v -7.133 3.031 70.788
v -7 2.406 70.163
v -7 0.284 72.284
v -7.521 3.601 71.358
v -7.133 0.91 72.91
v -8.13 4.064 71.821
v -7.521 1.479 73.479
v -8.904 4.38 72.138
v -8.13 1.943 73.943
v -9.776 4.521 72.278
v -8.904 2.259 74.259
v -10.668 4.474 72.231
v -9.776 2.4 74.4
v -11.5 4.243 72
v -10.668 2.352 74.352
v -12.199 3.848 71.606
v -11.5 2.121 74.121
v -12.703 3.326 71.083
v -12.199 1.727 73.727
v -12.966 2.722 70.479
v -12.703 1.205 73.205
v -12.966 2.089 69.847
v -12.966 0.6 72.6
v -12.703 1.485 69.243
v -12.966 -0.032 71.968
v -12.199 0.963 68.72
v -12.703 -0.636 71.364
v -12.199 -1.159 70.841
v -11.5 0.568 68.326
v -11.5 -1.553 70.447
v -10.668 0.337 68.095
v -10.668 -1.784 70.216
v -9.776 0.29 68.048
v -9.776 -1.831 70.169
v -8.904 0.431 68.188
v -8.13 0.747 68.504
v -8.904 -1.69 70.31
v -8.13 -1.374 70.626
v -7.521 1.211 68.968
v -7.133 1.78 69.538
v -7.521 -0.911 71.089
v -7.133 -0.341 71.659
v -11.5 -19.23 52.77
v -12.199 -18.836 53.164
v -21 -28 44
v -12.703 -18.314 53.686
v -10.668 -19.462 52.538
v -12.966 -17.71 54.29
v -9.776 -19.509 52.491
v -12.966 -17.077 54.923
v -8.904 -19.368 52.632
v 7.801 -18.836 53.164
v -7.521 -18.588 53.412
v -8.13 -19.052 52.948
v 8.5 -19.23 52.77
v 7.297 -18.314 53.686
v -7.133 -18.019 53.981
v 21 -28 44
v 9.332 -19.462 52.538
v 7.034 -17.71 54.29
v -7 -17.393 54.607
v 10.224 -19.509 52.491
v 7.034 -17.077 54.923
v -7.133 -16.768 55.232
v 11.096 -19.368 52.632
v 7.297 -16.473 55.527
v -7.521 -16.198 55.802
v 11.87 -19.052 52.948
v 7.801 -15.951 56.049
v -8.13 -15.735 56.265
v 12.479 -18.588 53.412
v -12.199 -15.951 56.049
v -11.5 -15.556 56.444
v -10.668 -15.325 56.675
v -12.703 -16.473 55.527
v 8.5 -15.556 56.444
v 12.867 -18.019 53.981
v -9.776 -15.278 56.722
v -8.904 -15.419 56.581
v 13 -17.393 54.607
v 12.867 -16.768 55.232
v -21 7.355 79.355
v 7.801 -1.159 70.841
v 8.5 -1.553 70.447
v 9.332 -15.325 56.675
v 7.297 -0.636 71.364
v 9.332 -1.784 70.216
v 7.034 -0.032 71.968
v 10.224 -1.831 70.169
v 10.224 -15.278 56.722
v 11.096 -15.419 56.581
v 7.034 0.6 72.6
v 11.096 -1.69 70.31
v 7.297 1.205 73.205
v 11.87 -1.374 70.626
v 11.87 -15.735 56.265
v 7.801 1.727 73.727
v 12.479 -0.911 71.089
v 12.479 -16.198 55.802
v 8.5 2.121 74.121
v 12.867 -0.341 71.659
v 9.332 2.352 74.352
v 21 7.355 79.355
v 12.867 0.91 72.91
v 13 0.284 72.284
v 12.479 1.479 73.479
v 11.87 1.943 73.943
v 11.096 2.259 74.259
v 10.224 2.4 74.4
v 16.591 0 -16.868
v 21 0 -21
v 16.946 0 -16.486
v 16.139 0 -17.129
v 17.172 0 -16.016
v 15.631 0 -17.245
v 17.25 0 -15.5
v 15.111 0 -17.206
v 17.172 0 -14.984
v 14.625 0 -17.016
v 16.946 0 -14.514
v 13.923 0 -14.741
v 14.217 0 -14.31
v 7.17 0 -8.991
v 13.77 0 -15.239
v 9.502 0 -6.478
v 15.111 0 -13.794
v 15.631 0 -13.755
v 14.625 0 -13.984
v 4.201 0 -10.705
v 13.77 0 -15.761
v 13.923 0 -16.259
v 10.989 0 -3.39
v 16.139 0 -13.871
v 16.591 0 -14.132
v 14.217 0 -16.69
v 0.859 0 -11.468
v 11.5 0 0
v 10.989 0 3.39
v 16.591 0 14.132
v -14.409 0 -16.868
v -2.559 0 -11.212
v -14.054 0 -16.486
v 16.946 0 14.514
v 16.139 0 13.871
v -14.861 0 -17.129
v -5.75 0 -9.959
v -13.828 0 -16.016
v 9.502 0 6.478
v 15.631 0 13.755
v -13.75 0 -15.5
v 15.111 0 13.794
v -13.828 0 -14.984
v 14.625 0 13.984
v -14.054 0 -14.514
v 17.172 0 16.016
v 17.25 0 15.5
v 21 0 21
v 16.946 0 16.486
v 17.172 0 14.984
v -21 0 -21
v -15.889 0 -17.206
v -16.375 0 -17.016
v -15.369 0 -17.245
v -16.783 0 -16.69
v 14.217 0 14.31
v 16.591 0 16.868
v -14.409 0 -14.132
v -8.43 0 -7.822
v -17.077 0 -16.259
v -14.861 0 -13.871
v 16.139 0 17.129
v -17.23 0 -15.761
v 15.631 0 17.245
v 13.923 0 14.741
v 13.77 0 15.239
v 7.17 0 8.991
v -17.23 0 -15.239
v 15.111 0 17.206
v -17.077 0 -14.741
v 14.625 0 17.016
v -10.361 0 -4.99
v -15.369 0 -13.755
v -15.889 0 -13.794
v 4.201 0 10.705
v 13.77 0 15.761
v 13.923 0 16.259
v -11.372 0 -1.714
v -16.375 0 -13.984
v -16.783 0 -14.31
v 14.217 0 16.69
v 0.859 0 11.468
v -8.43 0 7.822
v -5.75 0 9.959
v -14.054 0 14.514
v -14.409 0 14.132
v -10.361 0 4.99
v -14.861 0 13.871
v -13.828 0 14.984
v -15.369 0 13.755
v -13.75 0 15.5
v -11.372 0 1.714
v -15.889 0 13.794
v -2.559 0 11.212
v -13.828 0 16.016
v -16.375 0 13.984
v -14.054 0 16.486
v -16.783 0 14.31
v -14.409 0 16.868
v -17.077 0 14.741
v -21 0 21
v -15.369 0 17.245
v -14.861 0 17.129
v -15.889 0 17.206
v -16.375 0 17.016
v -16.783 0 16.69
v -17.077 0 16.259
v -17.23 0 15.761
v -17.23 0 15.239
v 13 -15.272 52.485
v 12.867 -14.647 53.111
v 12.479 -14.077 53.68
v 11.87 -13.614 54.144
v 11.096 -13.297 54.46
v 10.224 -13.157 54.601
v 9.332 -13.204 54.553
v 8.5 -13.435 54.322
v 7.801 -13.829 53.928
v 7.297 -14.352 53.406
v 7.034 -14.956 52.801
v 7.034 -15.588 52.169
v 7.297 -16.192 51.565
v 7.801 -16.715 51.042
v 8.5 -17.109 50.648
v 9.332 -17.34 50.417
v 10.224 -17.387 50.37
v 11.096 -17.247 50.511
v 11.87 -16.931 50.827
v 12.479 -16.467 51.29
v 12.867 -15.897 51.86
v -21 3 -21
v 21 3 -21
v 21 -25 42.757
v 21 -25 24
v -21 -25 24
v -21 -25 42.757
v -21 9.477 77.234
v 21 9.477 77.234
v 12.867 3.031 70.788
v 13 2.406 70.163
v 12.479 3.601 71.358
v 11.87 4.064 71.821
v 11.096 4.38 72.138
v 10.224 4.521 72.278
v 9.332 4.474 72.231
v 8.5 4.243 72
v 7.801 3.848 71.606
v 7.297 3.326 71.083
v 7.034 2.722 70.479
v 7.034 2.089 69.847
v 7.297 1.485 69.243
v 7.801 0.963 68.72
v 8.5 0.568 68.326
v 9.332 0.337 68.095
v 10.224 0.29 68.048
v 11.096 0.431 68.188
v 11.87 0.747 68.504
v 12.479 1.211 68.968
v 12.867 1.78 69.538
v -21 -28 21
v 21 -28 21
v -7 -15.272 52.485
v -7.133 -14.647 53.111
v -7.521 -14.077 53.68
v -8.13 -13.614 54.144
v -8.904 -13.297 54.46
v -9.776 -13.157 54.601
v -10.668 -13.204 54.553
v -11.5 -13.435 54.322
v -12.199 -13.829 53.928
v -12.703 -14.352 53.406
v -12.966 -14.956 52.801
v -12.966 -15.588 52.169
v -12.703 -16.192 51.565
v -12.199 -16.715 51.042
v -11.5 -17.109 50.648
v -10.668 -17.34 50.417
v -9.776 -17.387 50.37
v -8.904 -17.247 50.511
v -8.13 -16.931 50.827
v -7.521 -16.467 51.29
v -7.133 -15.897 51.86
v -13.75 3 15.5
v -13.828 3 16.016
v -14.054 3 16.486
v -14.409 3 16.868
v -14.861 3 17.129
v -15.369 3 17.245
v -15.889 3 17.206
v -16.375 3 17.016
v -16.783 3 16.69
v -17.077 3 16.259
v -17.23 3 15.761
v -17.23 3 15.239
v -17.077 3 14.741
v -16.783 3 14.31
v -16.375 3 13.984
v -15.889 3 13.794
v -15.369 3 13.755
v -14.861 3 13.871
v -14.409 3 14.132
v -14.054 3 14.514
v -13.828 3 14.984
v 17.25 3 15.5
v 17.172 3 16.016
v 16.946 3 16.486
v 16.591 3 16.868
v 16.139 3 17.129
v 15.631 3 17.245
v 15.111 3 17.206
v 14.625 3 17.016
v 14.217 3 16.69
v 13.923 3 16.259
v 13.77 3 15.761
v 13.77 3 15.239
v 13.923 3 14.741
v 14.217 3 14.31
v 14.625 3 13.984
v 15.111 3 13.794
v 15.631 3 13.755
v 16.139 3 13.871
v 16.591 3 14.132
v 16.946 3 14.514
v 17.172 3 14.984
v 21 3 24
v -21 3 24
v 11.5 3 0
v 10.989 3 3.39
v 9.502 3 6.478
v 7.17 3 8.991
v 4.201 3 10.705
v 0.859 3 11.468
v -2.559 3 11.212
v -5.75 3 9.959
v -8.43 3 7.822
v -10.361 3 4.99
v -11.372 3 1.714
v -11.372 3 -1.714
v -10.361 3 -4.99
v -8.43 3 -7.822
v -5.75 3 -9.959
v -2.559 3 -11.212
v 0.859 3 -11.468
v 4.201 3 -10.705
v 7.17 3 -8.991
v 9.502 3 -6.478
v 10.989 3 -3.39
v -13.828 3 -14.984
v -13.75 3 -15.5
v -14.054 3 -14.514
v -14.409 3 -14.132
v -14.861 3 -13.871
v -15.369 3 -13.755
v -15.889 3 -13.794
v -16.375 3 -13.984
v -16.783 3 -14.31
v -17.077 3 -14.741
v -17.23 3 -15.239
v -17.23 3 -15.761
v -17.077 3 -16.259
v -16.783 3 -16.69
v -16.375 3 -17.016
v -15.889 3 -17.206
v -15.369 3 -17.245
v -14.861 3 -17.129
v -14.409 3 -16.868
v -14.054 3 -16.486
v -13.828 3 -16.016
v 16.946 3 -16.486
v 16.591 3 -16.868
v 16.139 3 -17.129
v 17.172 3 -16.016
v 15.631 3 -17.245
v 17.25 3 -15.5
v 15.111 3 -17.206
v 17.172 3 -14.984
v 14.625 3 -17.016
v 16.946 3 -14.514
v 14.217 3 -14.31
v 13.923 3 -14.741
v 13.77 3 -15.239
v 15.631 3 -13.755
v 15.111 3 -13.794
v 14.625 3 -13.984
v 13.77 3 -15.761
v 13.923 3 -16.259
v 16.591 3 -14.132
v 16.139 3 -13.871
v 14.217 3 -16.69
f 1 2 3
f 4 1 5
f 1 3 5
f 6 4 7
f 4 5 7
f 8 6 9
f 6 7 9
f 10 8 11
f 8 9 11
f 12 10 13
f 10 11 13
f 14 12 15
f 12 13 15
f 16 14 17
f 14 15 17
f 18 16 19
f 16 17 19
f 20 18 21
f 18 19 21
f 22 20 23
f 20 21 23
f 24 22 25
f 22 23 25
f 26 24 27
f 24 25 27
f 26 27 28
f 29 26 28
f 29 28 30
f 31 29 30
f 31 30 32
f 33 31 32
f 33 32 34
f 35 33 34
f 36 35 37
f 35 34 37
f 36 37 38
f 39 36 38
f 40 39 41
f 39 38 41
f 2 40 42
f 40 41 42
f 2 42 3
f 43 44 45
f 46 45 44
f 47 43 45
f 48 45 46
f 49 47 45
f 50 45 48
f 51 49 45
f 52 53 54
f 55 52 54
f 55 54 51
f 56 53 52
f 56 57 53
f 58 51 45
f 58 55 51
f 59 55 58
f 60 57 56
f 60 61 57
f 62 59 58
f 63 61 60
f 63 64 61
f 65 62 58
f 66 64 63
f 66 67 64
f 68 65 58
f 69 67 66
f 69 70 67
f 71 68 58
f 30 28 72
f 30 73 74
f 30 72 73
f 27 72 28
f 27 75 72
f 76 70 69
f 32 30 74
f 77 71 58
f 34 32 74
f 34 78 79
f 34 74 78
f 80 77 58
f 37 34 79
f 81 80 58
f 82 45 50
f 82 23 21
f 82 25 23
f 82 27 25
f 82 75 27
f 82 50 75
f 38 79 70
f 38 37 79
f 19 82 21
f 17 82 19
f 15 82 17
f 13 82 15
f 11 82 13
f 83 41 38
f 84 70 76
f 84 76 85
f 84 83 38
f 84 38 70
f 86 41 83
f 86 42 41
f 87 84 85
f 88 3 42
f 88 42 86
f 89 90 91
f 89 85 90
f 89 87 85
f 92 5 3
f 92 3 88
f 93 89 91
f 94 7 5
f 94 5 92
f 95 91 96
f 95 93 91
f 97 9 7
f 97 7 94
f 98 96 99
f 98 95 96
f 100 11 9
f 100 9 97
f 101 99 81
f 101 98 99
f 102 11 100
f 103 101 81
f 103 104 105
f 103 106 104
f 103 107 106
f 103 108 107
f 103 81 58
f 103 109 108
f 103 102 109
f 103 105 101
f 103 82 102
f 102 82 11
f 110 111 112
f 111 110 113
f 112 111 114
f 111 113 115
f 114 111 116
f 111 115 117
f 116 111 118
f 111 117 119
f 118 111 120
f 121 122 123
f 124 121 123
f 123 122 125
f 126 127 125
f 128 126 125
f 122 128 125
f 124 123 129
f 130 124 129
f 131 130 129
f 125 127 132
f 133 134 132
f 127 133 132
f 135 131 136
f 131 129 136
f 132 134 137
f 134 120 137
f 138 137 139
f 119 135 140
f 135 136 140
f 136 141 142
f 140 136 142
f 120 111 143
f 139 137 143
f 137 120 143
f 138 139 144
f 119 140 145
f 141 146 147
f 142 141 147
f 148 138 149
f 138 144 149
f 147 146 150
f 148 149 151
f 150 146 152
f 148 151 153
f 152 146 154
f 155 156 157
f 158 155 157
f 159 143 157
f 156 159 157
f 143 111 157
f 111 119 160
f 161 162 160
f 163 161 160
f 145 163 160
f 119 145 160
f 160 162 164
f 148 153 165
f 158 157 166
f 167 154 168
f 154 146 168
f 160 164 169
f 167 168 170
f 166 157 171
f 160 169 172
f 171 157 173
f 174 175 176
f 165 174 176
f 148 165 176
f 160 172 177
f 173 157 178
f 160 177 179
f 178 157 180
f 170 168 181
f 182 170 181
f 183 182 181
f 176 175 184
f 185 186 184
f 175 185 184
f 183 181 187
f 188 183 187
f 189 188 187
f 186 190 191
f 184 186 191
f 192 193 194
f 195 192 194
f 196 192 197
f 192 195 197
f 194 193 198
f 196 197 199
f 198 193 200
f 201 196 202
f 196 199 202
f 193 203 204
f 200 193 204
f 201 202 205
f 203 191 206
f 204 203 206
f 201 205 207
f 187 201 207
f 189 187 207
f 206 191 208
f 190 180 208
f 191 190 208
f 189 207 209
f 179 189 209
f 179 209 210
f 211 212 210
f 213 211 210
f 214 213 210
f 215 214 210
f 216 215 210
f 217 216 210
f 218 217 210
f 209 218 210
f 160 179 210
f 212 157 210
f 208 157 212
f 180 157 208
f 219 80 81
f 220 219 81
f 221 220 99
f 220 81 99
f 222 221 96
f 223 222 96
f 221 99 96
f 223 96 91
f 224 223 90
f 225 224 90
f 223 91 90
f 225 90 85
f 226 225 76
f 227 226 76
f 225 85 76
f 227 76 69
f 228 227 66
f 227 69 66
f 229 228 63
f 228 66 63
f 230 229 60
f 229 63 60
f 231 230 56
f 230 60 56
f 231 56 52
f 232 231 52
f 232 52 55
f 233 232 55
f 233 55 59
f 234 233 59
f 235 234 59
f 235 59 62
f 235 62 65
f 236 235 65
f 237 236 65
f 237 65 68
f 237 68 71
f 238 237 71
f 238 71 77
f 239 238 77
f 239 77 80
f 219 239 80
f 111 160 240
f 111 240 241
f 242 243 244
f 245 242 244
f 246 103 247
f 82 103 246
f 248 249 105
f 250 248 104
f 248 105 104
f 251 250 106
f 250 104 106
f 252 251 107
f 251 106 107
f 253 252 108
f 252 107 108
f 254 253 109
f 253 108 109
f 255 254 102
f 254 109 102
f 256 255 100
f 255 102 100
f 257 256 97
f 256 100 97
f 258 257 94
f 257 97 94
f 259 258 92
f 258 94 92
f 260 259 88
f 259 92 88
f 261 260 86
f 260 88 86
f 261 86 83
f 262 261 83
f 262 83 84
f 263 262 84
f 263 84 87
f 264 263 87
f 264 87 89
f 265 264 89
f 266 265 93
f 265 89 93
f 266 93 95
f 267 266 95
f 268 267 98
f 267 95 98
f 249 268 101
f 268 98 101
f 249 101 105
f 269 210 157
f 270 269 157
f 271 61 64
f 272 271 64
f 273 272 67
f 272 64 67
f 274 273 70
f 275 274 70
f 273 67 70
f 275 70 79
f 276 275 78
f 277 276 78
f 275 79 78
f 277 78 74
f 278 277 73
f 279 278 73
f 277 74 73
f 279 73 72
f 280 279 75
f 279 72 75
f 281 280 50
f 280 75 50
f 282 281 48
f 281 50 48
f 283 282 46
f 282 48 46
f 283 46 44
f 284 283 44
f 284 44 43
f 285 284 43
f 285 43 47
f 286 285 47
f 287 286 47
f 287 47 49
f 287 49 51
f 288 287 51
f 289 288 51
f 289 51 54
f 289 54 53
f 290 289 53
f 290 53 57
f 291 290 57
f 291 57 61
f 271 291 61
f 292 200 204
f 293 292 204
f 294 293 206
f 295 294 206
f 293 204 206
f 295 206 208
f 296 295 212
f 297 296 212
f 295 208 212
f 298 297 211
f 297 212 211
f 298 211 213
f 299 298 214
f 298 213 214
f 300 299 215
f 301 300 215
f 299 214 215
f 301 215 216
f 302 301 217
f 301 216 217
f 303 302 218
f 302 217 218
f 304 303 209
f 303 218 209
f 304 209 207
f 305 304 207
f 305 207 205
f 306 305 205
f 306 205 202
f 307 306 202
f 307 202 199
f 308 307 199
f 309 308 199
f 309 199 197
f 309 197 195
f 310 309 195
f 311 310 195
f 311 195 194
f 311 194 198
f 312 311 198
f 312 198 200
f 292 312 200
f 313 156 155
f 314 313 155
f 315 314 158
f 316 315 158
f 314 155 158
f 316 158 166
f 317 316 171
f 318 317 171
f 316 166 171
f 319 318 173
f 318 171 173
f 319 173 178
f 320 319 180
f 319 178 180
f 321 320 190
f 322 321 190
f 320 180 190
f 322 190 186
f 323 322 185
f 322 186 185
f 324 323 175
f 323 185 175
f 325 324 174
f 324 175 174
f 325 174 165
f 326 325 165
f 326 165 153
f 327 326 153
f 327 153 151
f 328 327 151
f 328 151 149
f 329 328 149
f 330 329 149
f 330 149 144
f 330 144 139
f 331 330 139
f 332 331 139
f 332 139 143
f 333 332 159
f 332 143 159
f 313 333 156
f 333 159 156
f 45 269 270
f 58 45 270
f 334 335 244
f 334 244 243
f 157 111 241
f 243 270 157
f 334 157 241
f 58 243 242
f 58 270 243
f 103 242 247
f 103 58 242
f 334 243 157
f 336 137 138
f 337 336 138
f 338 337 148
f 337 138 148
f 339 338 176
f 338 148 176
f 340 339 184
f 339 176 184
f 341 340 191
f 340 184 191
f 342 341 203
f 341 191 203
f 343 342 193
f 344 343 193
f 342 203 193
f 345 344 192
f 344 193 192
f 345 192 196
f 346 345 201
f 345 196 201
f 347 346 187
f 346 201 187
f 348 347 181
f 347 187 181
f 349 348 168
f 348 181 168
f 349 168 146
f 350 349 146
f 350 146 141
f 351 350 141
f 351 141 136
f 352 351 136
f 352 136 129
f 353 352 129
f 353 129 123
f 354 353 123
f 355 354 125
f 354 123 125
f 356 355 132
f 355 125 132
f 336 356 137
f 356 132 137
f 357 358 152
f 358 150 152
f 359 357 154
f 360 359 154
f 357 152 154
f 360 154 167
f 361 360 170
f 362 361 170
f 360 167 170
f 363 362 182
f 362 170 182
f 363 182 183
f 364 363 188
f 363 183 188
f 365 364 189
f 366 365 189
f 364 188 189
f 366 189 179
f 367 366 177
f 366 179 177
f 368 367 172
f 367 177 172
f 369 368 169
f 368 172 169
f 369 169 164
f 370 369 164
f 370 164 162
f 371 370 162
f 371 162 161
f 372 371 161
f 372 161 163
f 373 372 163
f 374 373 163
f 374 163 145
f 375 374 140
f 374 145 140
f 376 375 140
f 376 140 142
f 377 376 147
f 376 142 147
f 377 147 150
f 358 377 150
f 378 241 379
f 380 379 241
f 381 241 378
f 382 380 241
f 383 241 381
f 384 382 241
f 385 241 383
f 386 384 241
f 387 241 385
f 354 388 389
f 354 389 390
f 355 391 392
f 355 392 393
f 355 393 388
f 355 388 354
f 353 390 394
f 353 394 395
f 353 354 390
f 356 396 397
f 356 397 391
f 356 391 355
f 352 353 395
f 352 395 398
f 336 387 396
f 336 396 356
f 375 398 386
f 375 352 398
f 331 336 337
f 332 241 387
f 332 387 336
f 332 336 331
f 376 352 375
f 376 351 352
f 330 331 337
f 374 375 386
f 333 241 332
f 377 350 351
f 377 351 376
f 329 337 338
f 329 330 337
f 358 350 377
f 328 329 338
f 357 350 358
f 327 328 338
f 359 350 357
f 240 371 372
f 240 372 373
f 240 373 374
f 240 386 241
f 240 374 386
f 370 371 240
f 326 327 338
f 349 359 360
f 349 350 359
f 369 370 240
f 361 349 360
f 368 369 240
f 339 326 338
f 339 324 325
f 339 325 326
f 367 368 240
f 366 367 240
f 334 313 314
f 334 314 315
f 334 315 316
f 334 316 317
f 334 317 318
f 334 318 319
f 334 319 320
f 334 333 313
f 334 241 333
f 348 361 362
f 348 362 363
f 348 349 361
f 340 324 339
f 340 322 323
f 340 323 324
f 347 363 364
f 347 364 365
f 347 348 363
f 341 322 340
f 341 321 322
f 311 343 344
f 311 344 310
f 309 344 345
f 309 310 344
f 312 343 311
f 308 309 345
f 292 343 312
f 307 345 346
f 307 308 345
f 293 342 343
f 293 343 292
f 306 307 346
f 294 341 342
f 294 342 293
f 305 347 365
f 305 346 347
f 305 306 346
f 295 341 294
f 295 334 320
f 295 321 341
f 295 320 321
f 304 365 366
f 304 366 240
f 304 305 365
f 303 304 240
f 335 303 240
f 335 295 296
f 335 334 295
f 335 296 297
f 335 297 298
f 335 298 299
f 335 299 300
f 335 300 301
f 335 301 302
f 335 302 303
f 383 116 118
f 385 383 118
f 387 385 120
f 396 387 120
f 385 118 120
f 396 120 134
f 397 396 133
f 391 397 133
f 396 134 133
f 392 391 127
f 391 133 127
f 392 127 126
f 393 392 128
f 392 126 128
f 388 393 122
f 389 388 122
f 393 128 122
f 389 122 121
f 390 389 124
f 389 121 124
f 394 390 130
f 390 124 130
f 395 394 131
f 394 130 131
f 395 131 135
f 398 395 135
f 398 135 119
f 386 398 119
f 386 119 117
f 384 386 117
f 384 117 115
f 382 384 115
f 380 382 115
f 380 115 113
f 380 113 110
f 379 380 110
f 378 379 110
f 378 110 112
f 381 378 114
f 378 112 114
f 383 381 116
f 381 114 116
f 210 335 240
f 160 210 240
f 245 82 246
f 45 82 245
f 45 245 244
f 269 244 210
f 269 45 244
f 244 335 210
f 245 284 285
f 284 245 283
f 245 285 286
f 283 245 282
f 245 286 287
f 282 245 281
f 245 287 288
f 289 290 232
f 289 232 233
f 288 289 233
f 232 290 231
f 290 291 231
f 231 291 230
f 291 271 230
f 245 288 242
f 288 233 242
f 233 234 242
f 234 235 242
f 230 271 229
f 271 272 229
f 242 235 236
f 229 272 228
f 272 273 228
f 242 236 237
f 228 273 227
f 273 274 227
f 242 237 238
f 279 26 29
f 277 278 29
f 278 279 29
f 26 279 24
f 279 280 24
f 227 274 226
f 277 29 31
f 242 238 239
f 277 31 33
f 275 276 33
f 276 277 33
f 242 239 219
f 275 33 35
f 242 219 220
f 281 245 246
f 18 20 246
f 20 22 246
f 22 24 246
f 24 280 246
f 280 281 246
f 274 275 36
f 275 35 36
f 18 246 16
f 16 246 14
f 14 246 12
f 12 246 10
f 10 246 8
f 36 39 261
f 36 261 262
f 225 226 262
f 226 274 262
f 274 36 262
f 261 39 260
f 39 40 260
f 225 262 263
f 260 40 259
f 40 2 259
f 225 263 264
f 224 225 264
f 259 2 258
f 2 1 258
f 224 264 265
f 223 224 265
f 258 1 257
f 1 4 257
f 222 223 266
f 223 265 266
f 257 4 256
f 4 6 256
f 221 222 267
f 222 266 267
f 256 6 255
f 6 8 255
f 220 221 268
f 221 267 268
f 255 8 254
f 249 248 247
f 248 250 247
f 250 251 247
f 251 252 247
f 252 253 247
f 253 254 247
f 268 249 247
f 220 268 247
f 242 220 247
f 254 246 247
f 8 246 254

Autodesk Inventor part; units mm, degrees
ref_plane "YZ Plane" through (0, 0, 0) normal (1, 0, 0) x (0, 1, 0)
ref_plane "XZ Plane" through (0, 0, 0) normal (0, 1, 0) x (-1, 0, 0)
sketch "草图2" plane through (0, 0, 0) normal (0, 1, 0) x (-1, 0, 0)
  line L0 (-21, 21) -> (21, 21)
  line L1 (21, 21) -> (21, -21)
  line L2 (21, -21) -> (-21, -21)
  line L3 (-21, -21) -> (-21, 21)
  line L4 (-21, 21) -> (21, -21) construction
  line L5 (21, 21) -> (-21, -21) construction
  point P0 (0, 0)
  dimension "d3" = 42
  dimension "d4" = 42
extrude "拉伸2" add sketch "草图2" along normal blind 3
sketch "草图3" plane through (-21, 0, 21) normal (0, 0, 1) x (1, 0, 0)
  line L0 (0, 3) -> (42, 3) projected
  line L1 (0, 3) -> (42, 3)
  line L2 (42, 3) -> (42, -48)
  line L3 (42, -48) -> (0, -48)
  line L4 (0, -48) -> (0, 3)
  point P0 (21, 0)
  dimension "d7" = 51
extrude "拉伸3" add sketch "草图3" along normal blind 3
ref_plane "工作平面1" through (-21, -48, 24) normal (0, -0.7071, 0.7071) x (1, 0, 0)
sketch "草图7" plane through (0, 0, 0) normal (0, -1, 0) x (1, 0, 0)
  circle A0 centre (0, 0) radius 11.5
  circle A1 centre (-15.5, 15.5) radius 1.75
  circle A2 centre (-15.5, -15.5) radius 1.75
  circle A3 centre (15.5, -15.5) radius 1.75
  circle A4 centre (15.5, 15.5) radius 1.75
  dimension "d17" = 23
  dimension "d18" = 3.5
  dimension "d19" = 15.5
  dimension "d20" = 15.5
  dimension "d21" = 15.5
  dimension "d22" = 15.5
extrude "拉伸6" cut sketch "草图7" against normal blind 3
sketch "草图9" plane through (-21, 0, 24) normal (0, 0, 1) x (1, 0, 0)
  line L0 (0, 0) -> (0, -48) projected
  line L1 (42, -48) -> (42, 0) projected
  line L2 (0, -28) -> (42, -28)
  line L3 (42, -28) -> (42, -25)
  line L4 (42, -25) -> (0, -25)
  line L5 (0, -25) -> (0, -28)
  line L6 (0, -48) -> (42, -48) projected
  point P0 (21, 0)
  dimension "d32" = 3
  dimension "d33" = 20
extrude "拉伸8" add sketch "草图9" along normal blind 20 contours L4 L1 L2 L0
sketch "草图10" plane through (-21, 0, 24) normal (0, 0, 1) x (1, 0, 0)
  line L0 (42, -28) -> (0, -28) projected
  line L1 (0, -28) -> (0, -48) projected
  line L2 (0, -48) -> (42, -48) projected
  line L3 (42, -48) -> (42, -28) projected
  point P0 (21, 0)
extrude "拉伸9" cut sketch "草图10" against normal blind 20
sketch "草图11" plane through (-21, -48, 24) normal (0, -0.7071, 0.7071) x (1, 0, 0)
  line L0 (0, 28.2843) -> (42, 28.2843) projected
  line L1 (0, 28.2843) -> (42, 28.2843)
  line L2 (42, 28.2843) -> (42, 78.2843)
  line L3 (42, 78.2843) -> (0, 78.2843)
  line L4 (0, 78.2843) -> (0, 28.2843)
  point P0 (21, 16.9706)
  dimension "d38" = 42
  dimension "d39" = 50
extrude "拉伸10" add sketch "草图11" against normal blind 3
sketch "草图12" plane through (-21, -48, 24) normal (0, -0.7071, 0.7071) x (1, 0, 0)
  line L0 (0, 28.2843) -> (42, 28.2843) construction
  line L1 (21, 28.2843) -> (21, 78.2843) construction
  line L2 (0, 78.2843) -> (42, 78.2843) construction
  circle A0 centre (31, 43.2843) radius 3
  circle A1 centre (31, 68.2843) radius 3
  circle A2 centre (11, 43.2843) radius 3
  circle A3 centre (11, 68.2843) radius 3
  point P0 (21, 16.9706)
  dimension "d42" = 6
  dimension "d43" = 10
  dimension "d44" = 15
  dimension "d45" = 25
extrude "拉伸11" cut sketch "草图12" against normal blind 3
properties part number "电机座1"
